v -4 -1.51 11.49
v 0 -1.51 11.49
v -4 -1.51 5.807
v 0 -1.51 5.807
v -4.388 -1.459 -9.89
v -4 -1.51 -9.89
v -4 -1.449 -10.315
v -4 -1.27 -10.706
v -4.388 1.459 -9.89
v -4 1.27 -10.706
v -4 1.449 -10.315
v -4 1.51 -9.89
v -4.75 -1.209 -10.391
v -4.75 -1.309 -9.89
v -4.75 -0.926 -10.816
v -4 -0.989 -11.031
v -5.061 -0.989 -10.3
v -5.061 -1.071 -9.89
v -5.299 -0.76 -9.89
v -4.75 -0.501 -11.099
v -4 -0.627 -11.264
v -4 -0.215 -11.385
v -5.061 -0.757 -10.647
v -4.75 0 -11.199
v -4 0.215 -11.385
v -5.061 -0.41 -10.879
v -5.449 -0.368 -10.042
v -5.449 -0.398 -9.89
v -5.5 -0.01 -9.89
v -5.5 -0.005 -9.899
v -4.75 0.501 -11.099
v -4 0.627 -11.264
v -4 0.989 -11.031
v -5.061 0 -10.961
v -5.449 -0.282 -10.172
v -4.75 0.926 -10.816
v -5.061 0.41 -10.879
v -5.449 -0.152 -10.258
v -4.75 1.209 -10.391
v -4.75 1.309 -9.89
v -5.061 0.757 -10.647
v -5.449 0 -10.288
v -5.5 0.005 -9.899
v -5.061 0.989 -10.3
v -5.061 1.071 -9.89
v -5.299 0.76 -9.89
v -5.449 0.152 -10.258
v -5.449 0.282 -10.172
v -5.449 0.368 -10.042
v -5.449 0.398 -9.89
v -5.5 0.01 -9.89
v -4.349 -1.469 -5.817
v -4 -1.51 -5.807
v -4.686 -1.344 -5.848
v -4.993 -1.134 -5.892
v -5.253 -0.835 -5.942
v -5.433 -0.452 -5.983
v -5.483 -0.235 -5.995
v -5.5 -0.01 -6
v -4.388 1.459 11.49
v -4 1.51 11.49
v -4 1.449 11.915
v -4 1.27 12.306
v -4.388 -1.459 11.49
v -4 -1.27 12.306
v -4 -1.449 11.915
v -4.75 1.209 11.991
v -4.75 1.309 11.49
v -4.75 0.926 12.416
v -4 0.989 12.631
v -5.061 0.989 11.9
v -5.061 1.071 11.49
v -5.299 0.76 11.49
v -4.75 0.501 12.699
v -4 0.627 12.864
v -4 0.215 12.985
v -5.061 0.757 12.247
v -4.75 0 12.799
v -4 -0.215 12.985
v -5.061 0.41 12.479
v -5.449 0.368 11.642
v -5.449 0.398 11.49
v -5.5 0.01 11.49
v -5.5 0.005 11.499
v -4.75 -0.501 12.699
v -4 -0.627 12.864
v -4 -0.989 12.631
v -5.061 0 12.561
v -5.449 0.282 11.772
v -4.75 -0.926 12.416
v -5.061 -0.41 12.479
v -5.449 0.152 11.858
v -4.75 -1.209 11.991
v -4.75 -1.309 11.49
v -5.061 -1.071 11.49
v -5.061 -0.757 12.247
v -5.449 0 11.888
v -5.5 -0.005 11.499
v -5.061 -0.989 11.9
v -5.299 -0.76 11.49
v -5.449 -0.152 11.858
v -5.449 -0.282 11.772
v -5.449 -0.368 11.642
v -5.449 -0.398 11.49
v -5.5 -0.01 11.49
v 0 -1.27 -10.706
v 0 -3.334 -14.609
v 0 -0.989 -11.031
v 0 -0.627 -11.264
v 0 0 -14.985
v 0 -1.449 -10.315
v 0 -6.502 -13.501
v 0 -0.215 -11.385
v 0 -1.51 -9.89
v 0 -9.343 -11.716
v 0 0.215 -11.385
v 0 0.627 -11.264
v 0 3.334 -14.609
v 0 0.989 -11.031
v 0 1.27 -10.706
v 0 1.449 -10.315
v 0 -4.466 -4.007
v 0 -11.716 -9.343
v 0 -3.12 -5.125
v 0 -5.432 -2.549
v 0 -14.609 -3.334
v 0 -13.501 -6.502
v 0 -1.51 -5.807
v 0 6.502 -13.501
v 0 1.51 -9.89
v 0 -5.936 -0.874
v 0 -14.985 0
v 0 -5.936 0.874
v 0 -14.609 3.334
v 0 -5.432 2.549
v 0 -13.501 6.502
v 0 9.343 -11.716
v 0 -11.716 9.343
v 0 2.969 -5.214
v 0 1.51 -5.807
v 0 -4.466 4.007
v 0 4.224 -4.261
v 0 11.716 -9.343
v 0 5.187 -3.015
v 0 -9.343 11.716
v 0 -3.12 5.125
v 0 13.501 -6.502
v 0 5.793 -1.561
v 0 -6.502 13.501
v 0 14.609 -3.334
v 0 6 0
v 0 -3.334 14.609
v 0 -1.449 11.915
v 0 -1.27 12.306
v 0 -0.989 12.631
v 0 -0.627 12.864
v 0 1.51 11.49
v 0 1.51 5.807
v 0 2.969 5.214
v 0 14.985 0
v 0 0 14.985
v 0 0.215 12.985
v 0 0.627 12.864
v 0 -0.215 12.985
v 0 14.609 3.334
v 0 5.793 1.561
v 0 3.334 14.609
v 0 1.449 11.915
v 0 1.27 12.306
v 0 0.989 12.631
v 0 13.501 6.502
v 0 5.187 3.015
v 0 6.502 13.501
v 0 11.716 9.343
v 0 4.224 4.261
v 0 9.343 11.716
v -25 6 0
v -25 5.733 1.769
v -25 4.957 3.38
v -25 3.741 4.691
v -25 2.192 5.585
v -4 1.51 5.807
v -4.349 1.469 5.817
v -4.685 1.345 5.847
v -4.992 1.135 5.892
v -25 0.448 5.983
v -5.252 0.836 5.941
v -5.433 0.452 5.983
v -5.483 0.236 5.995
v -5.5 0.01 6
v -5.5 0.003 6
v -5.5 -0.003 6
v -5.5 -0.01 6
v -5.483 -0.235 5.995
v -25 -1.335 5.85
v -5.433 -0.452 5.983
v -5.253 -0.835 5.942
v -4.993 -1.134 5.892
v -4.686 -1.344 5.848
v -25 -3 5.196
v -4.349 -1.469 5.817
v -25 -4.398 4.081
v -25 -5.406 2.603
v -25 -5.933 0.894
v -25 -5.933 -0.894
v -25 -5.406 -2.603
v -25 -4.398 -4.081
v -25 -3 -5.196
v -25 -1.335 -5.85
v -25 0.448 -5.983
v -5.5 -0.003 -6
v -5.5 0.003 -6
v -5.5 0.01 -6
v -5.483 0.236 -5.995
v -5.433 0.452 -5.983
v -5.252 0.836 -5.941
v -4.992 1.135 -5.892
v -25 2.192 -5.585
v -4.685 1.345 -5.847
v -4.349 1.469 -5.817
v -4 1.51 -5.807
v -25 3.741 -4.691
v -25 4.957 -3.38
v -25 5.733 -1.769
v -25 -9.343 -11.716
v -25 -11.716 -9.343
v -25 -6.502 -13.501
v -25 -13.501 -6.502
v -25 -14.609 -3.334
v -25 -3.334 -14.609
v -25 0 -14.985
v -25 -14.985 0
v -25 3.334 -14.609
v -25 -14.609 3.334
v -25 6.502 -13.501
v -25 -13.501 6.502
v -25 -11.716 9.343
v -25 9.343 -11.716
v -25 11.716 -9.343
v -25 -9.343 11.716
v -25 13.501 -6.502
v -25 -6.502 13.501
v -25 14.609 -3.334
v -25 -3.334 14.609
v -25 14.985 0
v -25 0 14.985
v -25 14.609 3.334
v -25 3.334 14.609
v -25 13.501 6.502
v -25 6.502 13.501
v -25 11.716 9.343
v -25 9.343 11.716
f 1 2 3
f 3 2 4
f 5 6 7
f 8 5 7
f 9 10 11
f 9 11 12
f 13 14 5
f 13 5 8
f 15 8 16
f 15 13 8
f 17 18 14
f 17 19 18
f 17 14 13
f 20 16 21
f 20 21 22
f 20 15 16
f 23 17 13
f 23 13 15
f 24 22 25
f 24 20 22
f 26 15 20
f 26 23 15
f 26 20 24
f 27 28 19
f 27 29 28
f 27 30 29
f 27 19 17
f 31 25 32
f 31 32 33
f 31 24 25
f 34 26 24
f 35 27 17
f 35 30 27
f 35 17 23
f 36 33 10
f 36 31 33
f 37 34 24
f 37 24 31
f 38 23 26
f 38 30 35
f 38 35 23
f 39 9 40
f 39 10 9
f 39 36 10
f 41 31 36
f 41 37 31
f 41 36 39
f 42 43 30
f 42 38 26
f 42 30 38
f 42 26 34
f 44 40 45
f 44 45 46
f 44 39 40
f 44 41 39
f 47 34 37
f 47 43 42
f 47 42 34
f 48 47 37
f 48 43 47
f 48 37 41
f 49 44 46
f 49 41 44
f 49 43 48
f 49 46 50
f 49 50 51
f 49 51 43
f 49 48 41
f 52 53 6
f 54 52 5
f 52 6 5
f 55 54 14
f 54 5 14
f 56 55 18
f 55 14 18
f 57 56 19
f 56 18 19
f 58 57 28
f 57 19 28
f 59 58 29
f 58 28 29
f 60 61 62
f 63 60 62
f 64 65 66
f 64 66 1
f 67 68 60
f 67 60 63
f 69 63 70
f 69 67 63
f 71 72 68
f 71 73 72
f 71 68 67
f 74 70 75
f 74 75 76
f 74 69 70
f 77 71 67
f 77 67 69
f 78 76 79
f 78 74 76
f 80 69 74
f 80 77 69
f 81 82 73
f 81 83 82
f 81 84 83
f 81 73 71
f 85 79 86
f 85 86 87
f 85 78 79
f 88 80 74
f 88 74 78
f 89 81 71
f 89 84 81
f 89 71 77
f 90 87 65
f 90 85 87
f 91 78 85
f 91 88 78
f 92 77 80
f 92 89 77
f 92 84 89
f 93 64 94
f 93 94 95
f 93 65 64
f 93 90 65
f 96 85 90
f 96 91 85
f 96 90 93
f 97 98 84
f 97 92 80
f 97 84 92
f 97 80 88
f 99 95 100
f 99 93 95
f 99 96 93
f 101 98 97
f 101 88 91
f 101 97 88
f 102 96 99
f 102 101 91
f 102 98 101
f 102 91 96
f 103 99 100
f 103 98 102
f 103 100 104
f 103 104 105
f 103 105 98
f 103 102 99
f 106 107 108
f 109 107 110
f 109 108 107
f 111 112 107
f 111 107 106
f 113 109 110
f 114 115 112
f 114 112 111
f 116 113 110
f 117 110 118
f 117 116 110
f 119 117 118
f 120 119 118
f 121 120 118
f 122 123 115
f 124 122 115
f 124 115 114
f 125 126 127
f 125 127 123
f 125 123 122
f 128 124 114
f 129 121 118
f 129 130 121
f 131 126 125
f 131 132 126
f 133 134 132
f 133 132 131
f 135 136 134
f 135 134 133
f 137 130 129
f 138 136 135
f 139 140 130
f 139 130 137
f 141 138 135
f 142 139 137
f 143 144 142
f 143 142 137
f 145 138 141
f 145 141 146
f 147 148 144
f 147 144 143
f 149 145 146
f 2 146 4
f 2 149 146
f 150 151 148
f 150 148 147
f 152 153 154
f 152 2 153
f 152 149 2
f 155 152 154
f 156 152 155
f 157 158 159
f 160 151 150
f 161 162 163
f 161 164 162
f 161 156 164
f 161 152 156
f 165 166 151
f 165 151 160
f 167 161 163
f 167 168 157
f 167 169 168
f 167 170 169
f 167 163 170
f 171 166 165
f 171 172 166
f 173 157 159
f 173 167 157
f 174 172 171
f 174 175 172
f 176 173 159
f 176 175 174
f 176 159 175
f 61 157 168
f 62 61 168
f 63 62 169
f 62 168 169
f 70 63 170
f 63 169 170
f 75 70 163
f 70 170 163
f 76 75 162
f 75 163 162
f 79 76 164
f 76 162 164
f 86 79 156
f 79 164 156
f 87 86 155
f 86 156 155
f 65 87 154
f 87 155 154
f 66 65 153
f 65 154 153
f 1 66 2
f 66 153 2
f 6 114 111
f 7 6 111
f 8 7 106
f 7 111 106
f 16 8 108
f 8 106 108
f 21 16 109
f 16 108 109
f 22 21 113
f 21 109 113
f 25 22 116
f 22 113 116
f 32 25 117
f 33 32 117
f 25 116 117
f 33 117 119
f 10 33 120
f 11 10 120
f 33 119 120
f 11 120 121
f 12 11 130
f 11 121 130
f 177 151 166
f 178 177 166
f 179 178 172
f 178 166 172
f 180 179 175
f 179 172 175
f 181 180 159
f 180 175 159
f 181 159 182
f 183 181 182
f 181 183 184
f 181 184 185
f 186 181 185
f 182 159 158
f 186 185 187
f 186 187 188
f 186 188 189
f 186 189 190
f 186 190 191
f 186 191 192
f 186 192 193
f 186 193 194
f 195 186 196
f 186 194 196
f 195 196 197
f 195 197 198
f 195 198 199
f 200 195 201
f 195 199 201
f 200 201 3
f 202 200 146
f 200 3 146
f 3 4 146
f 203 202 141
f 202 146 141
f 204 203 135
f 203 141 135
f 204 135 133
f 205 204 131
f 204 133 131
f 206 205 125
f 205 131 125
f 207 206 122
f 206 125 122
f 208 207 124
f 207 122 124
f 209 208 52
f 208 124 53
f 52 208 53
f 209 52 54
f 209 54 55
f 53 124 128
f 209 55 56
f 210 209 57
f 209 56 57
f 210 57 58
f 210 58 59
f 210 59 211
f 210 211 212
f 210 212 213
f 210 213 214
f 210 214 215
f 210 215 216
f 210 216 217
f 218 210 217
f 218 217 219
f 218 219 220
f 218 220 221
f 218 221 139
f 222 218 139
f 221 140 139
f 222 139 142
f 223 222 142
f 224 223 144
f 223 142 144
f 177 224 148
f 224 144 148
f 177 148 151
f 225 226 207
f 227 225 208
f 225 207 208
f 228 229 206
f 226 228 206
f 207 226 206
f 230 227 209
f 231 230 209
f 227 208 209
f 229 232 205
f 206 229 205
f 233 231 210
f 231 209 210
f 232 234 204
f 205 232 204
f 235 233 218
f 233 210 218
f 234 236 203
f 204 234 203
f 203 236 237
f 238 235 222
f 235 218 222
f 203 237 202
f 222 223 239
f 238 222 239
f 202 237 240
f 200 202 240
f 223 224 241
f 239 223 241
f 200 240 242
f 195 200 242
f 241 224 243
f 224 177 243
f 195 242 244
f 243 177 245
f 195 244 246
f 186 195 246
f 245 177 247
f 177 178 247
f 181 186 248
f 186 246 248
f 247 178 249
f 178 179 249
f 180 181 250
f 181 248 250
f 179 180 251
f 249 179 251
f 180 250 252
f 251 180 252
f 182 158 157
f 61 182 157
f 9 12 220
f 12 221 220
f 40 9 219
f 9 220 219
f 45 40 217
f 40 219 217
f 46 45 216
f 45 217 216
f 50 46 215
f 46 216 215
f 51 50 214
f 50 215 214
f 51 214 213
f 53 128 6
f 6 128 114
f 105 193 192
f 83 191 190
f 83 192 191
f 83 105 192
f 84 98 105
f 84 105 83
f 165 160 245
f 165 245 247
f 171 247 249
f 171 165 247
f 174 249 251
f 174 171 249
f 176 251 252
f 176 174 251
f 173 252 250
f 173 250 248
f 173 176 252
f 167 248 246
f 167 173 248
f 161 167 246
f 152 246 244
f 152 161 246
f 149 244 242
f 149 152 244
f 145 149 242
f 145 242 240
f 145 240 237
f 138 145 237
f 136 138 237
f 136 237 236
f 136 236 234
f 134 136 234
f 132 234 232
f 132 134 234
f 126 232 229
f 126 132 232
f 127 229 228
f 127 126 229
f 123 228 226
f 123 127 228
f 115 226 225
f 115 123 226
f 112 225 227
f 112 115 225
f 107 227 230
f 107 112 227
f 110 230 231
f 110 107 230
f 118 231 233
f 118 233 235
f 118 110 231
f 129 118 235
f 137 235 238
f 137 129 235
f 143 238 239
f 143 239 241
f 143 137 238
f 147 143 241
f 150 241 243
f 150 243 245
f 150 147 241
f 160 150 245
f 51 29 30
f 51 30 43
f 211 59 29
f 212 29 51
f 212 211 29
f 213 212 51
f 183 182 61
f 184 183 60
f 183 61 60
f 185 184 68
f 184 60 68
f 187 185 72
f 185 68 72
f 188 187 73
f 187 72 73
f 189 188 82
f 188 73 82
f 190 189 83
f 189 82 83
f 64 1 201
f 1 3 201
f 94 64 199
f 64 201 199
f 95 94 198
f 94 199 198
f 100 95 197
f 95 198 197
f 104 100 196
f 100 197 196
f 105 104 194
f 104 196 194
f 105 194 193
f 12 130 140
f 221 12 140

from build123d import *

# Parameters (mm, degrees)
F0_R     = 14.985
F0_R_2   = 6
F1_DEPTH = 25
F3_DEPTH = 5.5
F4_R     = 1.5


with BuildPart() as f1:
    # F0 (on Right) → F1 (new body)
    with BuildSketch(Plane.YZ):
        Circle(F0_R)
        Circle(F0_R_2, mode=Mode.SUBTRACT)
    extrude(amount=-F1_DEPTH)

    # F2 (on Right) → F3 (cut)
    with BuildSketch(Plane.YZ):
        with BuildLine():
            ThreePointArc((1.51, 11.49), (0, 13), (-1.51, 11.49))
            Line((-1.51, 11.49), (-1.51, -9.89))
            ThreePointArc((-1.51, -9.89), (0, -11.4), (1.51, -9.89))
            Line((1.51, -9.89), (1.51, 11.49))
        make_face()
    extrude(amount=-F3_DEPTH, mode=Mode.SUBTRACT)

    # F4
    f4_edges = [f1.edges().sort_by_distance(p)[0] for p in [
        (-5.5, 1.51, 8.648442),
        (-5.5, 1.51, -7.848442),
    ]]
    fillet(f4_edges, radius=F4_R)


solid = f1.part
